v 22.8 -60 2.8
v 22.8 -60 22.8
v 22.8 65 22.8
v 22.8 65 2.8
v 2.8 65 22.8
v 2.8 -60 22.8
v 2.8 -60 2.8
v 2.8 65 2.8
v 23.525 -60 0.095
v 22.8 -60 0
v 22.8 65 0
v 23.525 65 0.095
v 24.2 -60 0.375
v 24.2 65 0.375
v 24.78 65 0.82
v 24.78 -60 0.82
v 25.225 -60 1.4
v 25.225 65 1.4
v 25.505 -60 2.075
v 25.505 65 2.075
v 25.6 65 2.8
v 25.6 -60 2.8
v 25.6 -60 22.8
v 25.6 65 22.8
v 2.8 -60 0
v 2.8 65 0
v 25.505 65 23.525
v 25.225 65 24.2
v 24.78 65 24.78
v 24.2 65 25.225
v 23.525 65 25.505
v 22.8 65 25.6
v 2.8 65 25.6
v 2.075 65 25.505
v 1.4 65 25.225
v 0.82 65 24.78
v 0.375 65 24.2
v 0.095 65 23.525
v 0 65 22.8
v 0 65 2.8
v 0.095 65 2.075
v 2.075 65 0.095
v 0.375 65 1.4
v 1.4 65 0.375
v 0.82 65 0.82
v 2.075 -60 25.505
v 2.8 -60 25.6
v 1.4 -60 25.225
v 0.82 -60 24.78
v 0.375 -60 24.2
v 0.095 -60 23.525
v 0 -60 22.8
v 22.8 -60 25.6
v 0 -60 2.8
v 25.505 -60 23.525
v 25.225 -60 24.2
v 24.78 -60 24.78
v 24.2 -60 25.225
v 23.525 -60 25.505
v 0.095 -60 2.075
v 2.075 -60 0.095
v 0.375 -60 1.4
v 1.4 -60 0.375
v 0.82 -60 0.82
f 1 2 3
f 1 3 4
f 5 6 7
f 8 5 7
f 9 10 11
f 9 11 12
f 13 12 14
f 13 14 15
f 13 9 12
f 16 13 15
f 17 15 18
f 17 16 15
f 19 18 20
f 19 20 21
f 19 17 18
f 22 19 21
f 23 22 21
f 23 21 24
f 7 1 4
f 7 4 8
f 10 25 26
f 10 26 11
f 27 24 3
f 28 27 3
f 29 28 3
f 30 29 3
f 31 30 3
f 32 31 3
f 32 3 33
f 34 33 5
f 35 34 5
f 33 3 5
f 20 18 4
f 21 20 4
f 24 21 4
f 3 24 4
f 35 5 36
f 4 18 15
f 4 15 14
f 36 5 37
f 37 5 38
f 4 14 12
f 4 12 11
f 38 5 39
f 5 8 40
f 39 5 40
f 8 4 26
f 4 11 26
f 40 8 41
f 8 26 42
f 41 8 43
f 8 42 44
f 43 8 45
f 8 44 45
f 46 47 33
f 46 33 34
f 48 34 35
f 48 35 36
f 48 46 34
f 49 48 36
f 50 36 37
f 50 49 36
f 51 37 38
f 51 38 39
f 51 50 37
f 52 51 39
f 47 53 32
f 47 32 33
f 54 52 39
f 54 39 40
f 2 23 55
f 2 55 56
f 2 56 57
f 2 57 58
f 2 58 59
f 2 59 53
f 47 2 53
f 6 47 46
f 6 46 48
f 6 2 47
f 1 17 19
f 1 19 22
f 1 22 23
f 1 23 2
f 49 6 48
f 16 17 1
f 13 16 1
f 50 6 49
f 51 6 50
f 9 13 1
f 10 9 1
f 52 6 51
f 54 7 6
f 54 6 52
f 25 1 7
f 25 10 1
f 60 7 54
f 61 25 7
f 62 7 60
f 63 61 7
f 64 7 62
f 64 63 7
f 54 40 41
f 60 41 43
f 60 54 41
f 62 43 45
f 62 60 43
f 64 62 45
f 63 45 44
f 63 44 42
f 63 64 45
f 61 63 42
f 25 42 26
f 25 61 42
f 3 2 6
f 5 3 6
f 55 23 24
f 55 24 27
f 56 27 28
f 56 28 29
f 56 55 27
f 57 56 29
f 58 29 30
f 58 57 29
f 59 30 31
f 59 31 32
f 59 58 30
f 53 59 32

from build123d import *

# Parameters (mm, degrees)
BOSS_EXTRUDE1_DEPTH      = 65
BOSS_EXTRUDE1_DEPTH_BACK = 60
SKETCH3_W                = 20
SKETCH3_H                = 20
CUT_EXTRUDE1_DEPTH       = 1040.5


with BuildPart() as part:
    # Sketch1 → Boss-Extrude1 (new, two sides: drawn at the far end of the back side and taken through both)
    with BuildSketch(Plane(origin=(0, 0, 0), x_dir=(1, 0, 0), z_dir=(0, 1, 0)).offset(-BOSS_EXTRUDE1_DEPTH_BACK)):
        with BuildLine():
            Line((2.8, 0), (22.8, 0))
            ThreePointArc((22.8, 0), (24.779898987, -0.820101013), (25.6, -2.8))
            Line((25.6, -2.8), (25.6, -22.8))
            ThreePointArc((25.6, -22.8), (24.779898987, -24.779898987), (22.8, -25.6))
            Line((22.8, -25.6), (2.8, -25.6))
            ThreePointArc((2.8, -25.6), (0.820101013, -24.779898987), (0, -22.8))
            Line((0, -22.8), (0, -2.8))
            ThreePointArc((0, -2.8), (0.820101013, -0.820101013), (2.8, 0))
        make_face()
    extrude(amount=BOSS_EXTRUDE1_DEPTH + BOSS_EXTRUDE1_DEPTH_BACK)

    # Sketch3 → Cut-Extrude1 (cut)
    with BuildSketch(Plane(origin=(0, -60, 0), x_dir=(-1, 0, 0), z_dir=(0, -1, 0))):
        with Locations((-12.8, -12.8)):
            Rectangle(SKETCH3_W, SKETCH3_H)
    extrude(amount=-CUT_EXTRUDE1_DEPTH, mode=Mode.SUBTRACT)


solid = part.part
